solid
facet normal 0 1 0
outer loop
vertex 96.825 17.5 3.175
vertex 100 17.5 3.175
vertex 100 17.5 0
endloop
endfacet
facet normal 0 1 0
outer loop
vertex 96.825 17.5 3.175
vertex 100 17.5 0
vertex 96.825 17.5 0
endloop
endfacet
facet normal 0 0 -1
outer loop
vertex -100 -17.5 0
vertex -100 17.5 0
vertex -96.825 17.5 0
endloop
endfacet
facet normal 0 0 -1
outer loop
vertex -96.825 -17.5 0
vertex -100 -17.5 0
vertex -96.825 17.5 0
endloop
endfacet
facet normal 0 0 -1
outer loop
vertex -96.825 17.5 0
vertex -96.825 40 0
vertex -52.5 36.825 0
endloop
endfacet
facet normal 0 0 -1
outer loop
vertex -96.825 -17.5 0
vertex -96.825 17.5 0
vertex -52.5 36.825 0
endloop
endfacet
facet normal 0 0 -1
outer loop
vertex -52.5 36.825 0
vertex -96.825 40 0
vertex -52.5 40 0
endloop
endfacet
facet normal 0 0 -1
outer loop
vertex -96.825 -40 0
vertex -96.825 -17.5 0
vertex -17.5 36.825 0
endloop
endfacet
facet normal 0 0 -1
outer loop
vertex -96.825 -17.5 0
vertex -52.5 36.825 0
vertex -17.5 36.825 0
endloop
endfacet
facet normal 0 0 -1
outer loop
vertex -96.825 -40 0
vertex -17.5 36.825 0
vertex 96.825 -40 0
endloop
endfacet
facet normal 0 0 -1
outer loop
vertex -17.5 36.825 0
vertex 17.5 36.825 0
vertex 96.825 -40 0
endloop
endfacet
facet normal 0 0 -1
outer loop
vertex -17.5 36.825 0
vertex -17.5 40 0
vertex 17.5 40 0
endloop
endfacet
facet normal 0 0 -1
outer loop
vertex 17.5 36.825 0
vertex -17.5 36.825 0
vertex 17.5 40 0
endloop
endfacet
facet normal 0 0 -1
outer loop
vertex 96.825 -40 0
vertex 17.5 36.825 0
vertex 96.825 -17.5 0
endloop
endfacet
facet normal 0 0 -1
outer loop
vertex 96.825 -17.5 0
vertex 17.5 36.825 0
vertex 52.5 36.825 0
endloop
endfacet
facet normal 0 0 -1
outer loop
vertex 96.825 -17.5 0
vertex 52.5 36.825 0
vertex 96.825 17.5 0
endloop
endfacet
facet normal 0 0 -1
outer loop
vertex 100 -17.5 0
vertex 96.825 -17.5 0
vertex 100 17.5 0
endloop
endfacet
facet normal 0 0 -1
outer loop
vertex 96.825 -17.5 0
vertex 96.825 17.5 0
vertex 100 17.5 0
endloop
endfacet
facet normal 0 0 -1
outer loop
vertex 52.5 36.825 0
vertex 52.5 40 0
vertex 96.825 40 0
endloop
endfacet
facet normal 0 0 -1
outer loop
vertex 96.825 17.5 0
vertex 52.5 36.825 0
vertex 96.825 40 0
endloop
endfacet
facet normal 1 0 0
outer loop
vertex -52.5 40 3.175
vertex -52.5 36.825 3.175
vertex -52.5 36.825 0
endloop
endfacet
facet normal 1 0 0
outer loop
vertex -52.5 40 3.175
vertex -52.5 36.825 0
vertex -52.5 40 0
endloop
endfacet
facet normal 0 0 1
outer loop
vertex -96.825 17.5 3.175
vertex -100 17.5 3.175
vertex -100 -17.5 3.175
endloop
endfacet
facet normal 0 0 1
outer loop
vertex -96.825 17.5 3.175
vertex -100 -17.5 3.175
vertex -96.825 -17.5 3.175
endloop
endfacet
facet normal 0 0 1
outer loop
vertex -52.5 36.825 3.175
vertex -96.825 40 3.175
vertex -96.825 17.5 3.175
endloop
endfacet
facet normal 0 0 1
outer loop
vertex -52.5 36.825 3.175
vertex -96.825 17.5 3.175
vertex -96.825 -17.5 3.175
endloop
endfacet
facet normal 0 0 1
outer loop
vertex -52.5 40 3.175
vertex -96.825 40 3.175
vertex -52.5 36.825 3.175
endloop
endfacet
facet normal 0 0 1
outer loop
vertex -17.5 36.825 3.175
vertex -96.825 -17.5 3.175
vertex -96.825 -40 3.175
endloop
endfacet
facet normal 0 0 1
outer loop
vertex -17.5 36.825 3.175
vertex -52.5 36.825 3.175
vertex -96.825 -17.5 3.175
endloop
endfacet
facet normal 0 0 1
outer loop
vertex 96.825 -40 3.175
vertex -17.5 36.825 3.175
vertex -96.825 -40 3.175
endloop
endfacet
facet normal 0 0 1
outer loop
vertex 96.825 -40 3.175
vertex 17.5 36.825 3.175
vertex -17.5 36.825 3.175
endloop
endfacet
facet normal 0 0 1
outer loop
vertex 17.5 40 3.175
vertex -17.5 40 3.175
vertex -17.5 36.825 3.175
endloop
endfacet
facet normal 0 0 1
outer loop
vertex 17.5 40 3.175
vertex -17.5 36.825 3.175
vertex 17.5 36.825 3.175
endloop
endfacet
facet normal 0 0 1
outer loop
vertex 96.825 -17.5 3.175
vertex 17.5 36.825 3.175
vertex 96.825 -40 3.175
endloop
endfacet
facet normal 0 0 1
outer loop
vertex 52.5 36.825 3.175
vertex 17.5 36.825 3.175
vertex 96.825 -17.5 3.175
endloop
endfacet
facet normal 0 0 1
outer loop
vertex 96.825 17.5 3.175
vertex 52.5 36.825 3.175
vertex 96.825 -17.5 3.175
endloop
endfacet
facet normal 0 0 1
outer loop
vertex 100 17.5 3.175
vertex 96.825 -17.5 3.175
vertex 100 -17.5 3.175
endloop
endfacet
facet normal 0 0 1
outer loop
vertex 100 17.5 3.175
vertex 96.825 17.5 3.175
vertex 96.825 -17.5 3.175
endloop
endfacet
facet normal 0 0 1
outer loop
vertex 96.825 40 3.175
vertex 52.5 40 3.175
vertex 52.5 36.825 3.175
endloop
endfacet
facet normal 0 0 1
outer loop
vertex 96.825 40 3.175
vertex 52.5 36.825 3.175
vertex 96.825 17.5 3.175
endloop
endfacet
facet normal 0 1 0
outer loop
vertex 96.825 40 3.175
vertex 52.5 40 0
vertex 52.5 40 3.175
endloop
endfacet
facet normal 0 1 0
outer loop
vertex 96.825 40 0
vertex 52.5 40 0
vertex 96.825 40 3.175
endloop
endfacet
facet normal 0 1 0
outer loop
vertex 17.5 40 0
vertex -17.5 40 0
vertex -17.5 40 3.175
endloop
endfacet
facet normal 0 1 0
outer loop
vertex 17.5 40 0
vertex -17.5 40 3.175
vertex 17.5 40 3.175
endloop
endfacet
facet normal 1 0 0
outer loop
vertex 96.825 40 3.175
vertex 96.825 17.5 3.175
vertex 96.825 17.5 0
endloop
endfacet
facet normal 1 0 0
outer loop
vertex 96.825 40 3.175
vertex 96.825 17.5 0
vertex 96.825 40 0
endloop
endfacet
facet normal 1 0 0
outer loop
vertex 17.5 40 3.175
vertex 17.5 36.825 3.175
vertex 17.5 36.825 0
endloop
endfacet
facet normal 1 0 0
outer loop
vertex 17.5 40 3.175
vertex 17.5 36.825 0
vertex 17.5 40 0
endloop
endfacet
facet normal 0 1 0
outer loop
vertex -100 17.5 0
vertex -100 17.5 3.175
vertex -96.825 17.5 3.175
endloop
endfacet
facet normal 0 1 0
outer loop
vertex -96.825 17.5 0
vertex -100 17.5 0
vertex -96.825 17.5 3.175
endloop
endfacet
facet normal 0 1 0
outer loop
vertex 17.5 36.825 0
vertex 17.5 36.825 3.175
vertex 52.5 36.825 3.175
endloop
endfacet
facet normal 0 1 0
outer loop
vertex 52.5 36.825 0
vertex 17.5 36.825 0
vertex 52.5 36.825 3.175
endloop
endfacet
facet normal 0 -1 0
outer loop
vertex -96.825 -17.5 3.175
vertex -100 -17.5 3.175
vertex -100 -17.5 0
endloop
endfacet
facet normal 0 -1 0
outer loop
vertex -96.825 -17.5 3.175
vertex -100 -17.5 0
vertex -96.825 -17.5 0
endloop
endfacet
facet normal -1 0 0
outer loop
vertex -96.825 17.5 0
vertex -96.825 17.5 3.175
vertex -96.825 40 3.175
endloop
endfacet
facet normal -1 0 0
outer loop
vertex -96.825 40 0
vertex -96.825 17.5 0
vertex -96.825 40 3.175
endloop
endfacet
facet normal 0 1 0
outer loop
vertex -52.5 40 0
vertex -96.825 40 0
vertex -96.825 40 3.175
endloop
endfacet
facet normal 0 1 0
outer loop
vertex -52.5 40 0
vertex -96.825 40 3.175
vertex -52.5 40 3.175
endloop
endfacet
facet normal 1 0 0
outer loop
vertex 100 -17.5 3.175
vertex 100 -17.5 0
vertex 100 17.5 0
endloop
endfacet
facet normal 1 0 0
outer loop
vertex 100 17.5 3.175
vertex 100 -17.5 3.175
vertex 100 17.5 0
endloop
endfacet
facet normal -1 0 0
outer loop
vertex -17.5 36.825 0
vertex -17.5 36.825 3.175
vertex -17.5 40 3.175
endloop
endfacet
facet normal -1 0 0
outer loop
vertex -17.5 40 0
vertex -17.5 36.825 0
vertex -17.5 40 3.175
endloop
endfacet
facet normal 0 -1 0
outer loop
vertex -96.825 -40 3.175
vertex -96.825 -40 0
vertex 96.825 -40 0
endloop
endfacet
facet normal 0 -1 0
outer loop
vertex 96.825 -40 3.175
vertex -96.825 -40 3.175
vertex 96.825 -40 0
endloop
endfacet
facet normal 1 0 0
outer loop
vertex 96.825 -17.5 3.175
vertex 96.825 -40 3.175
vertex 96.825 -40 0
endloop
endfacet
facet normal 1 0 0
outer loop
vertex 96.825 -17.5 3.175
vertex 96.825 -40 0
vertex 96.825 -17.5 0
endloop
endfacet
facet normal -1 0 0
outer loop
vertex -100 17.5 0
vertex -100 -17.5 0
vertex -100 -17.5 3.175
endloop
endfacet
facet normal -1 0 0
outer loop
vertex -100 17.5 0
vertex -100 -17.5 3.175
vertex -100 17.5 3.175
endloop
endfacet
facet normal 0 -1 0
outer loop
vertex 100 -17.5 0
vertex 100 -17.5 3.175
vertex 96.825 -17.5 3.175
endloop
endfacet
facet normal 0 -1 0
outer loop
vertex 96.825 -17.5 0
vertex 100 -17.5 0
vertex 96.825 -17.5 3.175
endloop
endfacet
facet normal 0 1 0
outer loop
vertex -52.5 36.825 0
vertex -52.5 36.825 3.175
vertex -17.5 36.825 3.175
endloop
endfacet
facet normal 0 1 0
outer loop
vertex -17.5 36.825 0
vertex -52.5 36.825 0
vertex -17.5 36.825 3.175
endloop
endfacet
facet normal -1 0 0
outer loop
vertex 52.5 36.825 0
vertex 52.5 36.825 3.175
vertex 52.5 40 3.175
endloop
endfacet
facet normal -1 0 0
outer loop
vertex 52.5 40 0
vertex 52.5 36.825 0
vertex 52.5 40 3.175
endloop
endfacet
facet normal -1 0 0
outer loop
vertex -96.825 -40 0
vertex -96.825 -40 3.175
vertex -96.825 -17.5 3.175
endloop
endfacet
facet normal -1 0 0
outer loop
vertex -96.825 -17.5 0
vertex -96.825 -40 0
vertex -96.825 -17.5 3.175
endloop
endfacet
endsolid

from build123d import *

# Parameters (mm, degrees)
ESQUISSE2_W             = 200
ESQUISSE2_H             = 80
BOSS_EXTRU_1_DEPTH      = 3.175
ESQUISSE3_W             = 35
ESQUISSE3_H             = 3.175
ENL_V_MAT_EXTRU_1_DEPTH = 4.175
ESQUISSE4_W             = 3.175
ESQUISSE4_H             = 22.5
ENL_V_MAT_EXTRU_2_DEPTH = 4.175


with BuildPart() as part:
    # Esquisse2 → Boss.-Extru.1 (new body)
    with BuildSketch(Plane.XY):
        Rectangle(ESQUISSE2_W, ESQUISSE2_H)
    extrude(amount=BOSS_EXTRU_1_DEPTH)

    # Esquisse3 → Enlèv. mat.-Extru.1 (cut, through all)
    with BuildSketch(Plane.XY.offset(3.175)):
        with Locations((35, 38.4125)):
            Rectangle(ESQUISSE3_W, ESQUISSE3_H)
        with Locations((-35, 38.4125)):
            Rectangle(ESQUISSE3_W, ESQUISSE3_H)
    extrude(amount=-ENL_V_MAT_EXTRU_1_DEPTH, mode=Mode.SUBTRACT)

    # Esquisse4 → Enlèv. mat.-Extru.2 (cut, through all)
    with BuildSketch(Plane.XY.offset(3.175)):
        with Locations((-98.4125, 28.75)):
            Rectangle(ESQUISSE4_W, ESQUISSE4_H)
        with Locations((-98.4125, -28.75)):
            Rectangle(ESQUISSE4_W, ESQUISSE4_H)
    enl_v_mat_extru_2 = extrude(amount=-ENL_V_MAT_EXTRU_2_DEPTH, mode=Mode.SUBTRACT)

    # Symétrie1: Enlèv. mat.-Extru.2 across plane
    add(enl_v_mat_extru_2.mirror(Plane(origin=(0, 0, 0), x_dir=(0, 0, 1), z_dir=(1, 0, 0))), mode=Mode.SUBTRACT)


solid = part.part
